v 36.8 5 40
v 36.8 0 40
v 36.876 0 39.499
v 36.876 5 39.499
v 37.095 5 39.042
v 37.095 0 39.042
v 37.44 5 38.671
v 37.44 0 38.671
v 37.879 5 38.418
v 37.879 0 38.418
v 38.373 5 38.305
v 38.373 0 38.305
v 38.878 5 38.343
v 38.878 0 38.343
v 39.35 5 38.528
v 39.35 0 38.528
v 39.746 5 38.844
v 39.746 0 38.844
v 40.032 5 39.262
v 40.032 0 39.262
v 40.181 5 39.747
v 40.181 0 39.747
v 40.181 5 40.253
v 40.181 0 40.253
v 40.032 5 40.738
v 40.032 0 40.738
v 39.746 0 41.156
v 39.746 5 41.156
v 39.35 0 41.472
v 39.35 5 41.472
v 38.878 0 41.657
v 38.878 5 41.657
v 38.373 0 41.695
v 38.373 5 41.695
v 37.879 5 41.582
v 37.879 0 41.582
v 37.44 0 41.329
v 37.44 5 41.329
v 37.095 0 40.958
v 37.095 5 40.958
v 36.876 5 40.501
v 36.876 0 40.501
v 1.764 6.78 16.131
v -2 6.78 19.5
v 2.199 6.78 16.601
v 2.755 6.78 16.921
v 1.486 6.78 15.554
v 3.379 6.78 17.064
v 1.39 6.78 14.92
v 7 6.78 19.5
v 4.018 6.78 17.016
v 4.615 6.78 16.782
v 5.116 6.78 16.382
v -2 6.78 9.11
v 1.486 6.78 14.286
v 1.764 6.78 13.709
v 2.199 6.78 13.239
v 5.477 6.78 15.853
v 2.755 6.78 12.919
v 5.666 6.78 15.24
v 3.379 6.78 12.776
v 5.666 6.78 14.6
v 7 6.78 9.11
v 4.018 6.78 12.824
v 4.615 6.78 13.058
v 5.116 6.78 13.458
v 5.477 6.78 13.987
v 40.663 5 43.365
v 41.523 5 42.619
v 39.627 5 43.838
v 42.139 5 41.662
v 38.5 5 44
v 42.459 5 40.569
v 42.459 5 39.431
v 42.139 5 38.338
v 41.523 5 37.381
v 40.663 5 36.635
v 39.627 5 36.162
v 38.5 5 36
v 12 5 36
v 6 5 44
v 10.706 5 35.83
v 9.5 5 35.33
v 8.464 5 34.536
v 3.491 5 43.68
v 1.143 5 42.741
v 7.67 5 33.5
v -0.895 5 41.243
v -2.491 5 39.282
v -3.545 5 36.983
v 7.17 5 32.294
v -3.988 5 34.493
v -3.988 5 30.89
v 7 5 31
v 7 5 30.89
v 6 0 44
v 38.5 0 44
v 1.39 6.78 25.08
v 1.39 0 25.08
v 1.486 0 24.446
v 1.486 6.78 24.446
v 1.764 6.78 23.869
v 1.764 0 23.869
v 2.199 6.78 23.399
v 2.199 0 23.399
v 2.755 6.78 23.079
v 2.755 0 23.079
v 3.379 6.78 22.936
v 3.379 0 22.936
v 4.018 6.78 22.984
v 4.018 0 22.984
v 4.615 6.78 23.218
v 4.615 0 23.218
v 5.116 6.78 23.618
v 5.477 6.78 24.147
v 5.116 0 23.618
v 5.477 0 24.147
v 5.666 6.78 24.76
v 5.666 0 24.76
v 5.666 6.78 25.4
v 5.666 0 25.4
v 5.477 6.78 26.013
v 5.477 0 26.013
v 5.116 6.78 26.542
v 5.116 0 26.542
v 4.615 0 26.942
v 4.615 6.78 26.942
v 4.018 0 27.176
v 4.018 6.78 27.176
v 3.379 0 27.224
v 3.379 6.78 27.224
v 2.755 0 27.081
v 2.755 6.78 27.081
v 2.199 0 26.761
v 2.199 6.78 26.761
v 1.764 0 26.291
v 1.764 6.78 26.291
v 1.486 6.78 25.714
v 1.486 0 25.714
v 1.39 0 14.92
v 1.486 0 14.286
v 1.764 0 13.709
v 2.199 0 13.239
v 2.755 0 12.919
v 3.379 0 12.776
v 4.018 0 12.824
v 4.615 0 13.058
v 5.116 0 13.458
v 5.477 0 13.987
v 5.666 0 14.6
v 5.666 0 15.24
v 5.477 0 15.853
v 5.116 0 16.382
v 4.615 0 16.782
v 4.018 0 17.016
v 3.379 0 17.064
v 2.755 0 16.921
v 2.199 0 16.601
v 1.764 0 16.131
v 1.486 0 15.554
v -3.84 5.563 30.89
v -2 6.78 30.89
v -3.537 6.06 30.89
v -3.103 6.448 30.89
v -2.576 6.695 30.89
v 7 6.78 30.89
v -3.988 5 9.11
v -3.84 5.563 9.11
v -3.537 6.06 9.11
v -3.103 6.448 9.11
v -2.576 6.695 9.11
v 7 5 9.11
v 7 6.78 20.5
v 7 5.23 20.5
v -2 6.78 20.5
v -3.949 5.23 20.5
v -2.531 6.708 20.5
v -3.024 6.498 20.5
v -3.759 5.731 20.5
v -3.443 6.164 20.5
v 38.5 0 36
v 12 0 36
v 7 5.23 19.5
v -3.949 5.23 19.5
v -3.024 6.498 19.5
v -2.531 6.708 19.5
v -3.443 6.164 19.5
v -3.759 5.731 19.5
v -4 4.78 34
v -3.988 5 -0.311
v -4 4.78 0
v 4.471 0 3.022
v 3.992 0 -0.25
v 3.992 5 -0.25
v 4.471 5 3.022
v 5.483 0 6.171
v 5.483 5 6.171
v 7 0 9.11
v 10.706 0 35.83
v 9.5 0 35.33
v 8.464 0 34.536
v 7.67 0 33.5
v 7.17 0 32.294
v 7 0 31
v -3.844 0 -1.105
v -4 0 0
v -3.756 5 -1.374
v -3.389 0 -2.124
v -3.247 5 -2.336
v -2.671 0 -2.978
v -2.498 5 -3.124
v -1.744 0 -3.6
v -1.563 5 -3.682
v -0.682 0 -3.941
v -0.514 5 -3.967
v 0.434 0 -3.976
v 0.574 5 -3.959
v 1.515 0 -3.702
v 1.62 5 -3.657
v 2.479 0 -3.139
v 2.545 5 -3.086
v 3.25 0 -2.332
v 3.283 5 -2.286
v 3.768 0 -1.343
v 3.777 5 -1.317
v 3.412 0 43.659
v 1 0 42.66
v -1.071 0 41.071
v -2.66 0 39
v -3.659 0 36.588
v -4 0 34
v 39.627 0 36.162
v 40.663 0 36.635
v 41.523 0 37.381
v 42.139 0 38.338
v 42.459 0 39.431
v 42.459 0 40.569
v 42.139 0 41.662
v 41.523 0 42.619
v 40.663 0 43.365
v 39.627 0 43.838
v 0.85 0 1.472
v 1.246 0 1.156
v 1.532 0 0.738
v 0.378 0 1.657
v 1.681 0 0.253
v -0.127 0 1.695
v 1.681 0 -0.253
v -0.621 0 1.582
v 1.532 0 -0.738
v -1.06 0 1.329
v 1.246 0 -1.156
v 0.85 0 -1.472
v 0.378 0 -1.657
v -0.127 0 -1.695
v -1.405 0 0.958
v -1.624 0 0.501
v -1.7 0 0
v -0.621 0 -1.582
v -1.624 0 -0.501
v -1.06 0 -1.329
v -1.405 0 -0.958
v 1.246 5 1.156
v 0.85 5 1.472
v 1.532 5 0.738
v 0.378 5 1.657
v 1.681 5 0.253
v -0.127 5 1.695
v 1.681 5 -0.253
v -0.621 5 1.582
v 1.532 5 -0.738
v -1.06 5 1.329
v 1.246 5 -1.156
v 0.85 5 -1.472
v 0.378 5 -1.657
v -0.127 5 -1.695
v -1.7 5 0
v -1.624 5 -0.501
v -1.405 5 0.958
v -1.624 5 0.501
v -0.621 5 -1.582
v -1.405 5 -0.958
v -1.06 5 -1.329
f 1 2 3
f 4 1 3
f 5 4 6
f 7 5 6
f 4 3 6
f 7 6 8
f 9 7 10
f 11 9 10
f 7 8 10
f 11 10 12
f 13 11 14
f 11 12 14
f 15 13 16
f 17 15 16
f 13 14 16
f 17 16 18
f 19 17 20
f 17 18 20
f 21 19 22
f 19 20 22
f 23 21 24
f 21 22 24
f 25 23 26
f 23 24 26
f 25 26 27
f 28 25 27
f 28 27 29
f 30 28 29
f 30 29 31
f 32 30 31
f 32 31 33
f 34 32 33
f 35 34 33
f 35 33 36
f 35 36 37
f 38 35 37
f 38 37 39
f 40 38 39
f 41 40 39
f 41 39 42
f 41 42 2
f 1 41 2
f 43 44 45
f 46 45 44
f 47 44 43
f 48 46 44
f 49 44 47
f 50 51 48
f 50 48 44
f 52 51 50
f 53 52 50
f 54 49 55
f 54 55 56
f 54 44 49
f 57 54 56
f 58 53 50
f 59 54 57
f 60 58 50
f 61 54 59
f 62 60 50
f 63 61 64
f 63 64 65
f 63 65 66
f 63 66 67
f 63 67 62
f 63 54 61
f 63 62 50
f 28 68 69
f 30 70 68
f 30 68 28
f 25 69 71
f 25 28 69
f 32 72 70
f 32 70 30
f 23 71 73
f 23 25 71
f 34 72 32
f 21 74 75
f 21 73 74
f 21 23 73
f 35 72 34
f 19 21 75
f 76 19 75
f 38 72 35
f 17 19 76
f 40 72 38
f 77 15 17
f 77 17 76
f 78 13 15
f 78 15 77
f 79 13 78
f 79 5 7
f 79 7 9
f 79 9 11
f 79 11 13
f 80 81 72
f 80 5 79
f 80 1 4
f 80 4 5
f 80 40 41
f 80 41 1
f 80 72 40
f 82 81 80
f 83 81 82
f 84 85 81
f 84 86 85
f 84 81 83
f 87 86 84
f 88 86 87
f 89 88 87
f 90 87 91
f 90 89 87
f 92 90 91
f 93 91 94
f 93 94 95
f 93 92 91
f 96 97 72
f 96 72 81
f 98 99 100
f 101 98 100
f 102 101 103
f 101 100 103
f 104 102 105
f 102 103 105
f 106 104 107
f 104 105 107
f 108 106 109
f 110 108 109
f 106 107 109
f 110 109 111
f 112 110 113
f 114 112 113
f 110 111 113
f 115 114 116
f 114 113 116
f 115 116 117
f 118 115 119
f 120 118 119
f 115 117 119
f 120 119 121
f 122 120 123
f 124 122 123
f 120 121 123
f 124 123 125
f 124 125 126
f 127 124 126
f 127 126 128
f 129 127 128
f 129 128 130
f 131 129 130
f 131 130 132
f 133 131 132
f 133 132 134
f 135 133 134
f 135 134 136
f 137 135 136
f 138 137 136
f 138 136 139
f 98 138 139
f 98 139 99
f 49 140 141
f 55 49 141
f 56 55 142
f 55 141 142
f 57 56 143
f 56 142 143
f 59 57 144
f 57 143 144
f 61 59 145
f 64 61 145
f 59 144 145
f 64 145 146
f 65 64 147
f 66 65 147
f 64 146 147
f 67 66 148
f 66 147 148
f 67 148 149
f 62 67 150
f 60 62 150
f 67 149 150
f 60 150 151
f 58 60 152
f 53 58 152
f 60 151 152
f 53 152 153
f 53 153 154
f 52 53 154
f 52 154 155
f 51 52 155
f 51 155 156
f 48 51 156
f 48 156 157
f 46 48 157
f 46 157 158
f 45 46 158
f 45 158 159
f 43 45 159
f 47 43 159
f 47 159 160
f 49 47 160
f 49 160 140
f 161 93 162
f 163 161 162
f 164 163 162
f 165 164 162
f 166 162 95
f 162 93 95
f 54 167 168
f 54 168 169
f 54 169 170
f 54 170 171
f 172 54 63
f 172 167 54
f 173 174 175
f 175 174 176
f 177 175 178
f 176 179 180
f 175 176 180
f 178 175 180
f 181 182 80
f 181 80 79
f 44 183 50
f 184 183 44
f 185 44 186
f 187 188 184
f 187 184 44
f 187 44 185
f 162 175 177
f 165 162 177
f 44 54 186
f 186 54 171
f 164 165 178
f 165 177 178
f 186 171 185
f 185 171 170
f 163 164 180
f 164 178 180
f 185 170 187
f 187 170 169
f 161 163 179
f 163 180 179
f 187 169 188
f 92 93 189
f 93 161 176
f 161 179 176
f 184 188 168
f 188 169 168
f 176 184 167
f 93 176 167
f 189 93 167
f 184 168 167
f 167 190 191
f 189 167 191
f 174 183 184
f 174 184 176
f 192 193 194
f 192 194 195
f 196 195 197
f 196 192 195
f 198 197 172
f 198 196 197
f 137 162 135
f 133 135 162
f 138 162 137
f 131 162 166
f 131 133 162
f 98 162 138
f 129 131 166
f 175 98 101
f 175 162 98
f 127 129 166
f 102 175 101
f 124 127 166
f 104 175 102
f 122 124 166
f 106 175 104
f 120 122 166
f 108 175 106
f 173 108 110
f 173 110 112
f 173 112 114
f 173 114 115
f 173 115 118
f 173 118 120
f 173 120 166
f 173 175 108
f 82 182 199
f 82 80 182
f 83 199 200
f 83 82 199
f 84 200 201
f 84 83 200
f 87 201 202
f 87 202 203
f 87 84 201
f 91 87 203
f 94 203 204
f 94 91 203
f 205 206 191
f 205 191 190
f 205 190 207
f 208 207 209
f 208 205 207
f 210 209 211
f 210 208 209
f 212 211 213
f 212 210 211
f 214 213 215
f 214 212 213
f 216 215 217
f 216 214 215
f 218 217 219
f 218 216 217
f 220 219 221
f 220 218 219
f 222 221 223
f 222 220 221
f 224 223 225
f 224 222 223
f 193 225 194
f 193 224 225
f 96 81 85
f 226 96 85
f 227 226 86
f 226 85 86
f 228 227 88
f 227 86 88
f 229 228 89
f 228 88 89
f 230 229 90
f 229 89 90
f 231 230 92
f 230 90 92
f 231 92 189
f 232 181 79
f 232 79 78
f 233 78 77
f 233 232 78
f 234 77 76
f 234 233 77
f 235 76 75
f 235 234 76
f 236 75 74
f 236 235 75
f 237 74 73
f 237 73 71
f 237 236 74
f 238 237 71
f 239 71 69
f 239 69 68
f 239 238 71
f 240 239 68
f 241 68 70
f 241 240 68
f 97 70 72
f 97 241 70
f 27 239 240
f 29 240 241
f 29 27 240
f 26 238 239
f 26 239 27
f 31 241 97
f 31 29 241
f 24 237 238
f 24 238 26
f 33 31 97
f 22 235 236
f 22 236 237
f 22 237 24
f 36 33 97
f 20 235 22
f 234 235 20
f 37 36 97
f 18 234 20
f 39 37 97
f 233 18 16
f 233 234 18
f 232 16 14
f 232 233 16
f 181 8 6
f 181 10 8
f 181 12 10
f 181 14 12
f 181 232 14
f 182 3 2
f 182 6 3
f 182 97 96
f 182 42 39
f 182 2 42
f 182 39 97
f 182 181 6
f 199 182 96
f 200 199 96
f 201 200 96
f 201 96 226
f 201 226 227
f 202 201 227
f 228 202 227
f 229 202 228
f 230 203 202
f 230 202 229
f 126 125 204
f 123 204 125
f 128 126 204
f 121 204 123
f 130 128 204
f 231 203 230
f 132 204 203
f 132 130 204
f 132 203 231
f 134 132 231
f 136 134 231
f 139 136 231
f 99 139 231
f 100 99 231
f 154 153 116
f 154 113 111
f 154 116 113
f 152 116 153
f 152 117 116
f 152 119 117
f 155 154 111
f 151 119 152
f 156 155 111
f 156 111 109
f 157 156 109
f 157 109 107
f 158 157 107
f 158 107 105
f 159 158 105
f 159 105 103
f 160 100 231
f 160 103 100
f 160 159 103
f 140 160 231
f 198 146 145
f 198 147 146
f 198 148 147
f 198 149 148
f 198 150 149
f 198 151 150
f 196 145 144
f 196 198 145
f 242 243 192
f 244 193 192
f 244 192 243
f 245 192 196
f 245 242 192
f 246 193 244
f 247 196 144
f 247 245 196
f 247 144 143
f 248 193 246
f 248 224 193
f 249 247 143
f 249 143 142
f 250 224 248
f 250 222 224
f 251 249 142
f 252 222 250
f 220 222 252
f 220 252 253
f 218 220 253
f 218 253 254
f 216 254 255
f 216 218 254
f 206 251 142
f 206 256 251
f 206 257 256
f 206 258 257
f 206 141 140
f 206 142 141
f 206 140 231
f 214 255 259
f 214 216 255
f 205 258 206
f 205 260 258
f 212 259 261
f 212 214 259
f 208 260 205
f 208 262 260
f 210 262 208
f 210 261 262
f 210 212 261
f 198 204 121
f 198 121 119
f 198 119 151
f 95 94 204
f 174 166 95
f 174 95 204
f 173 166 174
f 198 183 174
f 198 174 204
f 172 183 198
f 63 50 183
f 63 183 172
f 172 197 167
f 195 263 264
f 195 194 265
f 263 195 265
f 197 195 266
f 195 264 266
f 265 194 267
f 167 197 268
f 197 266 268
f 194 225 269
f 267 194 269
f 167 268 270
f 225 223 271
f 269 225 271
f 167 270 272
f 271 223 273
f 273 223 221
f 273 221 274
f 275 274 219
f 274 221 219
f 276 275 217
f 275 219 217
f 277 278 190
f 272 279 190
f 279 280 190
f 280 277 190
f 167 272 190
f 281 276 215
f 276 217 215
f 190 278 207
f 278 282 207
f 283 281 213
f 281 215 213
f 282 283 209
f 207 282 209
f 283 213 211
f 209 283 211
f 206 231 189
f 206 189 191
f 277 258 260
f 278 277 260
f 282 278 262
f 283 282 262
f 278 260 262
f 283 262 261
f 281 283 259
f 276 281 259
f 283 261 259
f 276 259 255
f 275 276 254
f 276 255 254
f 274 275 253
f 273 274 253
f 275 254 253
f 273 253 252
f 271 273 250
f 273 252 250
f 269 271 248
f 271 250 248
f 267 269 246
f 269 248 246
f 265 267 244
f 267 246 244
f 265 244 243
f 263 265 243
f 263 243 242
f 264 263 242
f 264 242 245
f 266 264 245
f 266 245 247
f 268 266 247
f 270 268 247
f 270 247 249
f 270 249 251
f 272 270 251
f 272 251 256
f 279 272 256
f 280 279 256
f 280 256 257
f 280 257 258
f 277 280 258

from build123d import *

# Parameters (mm, degrees)
BOSS_EXTRU_1_DEPTH      = 5
D_GAGEMENT_M31_D        = 3.4
ESQUISSE5_W             = 11
ESQUISSE5_H             = 21.78
BOSS_EXTRU_2_DEPTH      = 1.78
ESQUISSE6_W             = 1
ESQUISSE6_H             = 1.55
ENL_V_MAT_EXTRU_1_DEPTH = 65.375604075
D_GAGEMENT_M42_D        = 4.3
ESQUISSE9_W             = 5.11
ESQUISSE9_H             = 5
BOSS_EXTRU_3_DEPTH      = 3
CONG_2_R                = 5
CONG_3_R                = 10
CONG_4_R                = 2
CONG_5_R                = 20


with BuildPart() as part:
    # Esquisse2 → Boss.-Extru.1 (new body)
    with BuildSketch(Plane(origin=(0, 0, 0), x_dir=(1, 0, 0), z_dir=(0, 1, 0))):
        with BuildLine():
            Line((4, -36), (38.5, -36))
            ThreePointArc((38.5, -36), (42.5, -40), (38.5, -44))
            Line((38.5, -44), (-4, -44))
            Line((-4, -44), (-4, 0))
            ThreePointArc((-4, 0), (0, 4), (4, 0))
            Line((4, 0), (4, -9.11))
            Line((4, -9.11), (7, -9.11))
            Line((7, -9.11), (7, -30.89))
            Line((7, -30.89), (4, -30.89))
            Line((4, -30.89), (4, -36))
        make_face()
    extrude(amount=BOSS_EXTRU_1_DEPTH)

    # Dégagement M31 (through all)
    with Locations(Plane(origin=(0, 5, 0), x_dir=(1, 0, 0), z_dir=(0, 1, 0))):
        with Locations((0, 0), (38.5, -40)):
            Hole(D_GAGEMENT_M31_D / 2)

    # Esquisse5 → Boss.-Extru.2 (add)
    with BuildSketch(Plane(origin=(0, 5, 0), x_dir=(1, 0, 0), z_dir=(0, 1, 0))):
        with Locations((1.5, -20)):
            Rectangle(ESQUISSE5_W, ESQUISSE5_H)
    extrude(amount=BOSS_EXTRU_2_DEPTH)

    # Esquisse6 → Enlèv. mat.-Extru.1 (cut, through all)
    with BuildSketch(Plane.ZY.offset(4)):
        with Locations((20, 6.005)):
            Rectangle(ESQUISSE6_W, ESQUISSE6_H)
    extrude(amount=-ENL_V_MAT_EXTRU_1_DEPTH, mode=Mode.SUBTRACT)

    # Dégagement M42 (through all)
    with Locations(Plane(origin=(0, 6.78, 0), x_dir=(1, 0, 0), z_dir=(0, 1, 0))):
        with Locations((3.54, -25.08), (3.54, -14.92)):
            Hole(D_GAGEMENT_M42_D / 2)

    # Esquisse9 → Boss.-Extru.3 (add)
    with BuildSketch(Plane(origin=(4, 0, 0), x_dir=(0, 0, -1), z_dir=(1, 0, 0))):
        with Locations((-33.445, 2.5)):
            Rectangle(ESQUISSE9_W, ESQUISSE9_H)
    extrude(amount=BOSS_EXTRU_3_DEPTH)

    # Congé2
    cong_2_edges = [part.edges().sort_by_distance(p)[0] for p in [
        (7, 2.5, 36),
    ]]
    fillet(cong_2_edges, radius=CONG_2_R)

    # Congé3
    cong_3_edges = [part.edges().sort_by_distance(p)[0] for p in [
        (-4, 2.5, 44),
    ]]
    fillet(cong_3_edges, radius=CONG_3_R)

    # Congé4
    # the kernel refuses this fillet: 2 mm, written as the material it takes off along each edge
    with BuildSketch(Plane(origin=(-4, 6.78, -2.89), x_dir=(0, -1, 0), z_dir=(0, 0, 1)), Plane(origin=(-4, 6.78, 8.5), x_dir=(0, -1, 0), z_dir=(0, 0, 1))) as cong_4_piece_1:
        with BuildLine():
            CenterArc((CONG_4_R, CONG_4_R), CONG_4_R, 180, 90)
            Line((0, CONG_4_R), (-CONG_4_R * 0.02, CONG_4_R))
            Line((-CONG_4_R * 0.02, CONG_4_R), (-CONG_4_R * 0.02, -CONG_4_R * 0.02))
            Line((-CONG_4_R * 0.02, -CONG_4_R * 0.02), (CONG_4_R, -CONG_4_R * 0.02))
            Line((CONG_4_R, -CONG_4_R * 0.02), (CONG_4_R, 0))
        make_face()
    extrude(amount=34.39, mode=Mode.SUBTRACT)

    # Congé5
    # the kernel refuses this fillet: 20 mm, written as the material it adds along each edge
    with BuildSketch(Plane(origin=(4, 0, 9.11), x_dir=(1, 0, 0), z_dir=(0, 1, 0))) as cong_5_piece_1:
        with BuildLine():
            CenterArc((19.95301022, 10.611100059), CONG_5_R, 183.585953045, 28.45700877)
            Line((-0.00783163, 9.360183343), (-2.003915815, 9.235091672))
            ThreePointArc((-2.003915815, 9.235091672), (-2, 9.11), (-2, 0))
            Line((-2, 0), (0, -2))
            ThreePointArc((0, -2), (1.5, -2), (1.304698978, -1.061110006))
            Line((1.304698978, -1.061110006), (3, 0))
        make_face()
    extrude(amount=5)


solid = part.part
